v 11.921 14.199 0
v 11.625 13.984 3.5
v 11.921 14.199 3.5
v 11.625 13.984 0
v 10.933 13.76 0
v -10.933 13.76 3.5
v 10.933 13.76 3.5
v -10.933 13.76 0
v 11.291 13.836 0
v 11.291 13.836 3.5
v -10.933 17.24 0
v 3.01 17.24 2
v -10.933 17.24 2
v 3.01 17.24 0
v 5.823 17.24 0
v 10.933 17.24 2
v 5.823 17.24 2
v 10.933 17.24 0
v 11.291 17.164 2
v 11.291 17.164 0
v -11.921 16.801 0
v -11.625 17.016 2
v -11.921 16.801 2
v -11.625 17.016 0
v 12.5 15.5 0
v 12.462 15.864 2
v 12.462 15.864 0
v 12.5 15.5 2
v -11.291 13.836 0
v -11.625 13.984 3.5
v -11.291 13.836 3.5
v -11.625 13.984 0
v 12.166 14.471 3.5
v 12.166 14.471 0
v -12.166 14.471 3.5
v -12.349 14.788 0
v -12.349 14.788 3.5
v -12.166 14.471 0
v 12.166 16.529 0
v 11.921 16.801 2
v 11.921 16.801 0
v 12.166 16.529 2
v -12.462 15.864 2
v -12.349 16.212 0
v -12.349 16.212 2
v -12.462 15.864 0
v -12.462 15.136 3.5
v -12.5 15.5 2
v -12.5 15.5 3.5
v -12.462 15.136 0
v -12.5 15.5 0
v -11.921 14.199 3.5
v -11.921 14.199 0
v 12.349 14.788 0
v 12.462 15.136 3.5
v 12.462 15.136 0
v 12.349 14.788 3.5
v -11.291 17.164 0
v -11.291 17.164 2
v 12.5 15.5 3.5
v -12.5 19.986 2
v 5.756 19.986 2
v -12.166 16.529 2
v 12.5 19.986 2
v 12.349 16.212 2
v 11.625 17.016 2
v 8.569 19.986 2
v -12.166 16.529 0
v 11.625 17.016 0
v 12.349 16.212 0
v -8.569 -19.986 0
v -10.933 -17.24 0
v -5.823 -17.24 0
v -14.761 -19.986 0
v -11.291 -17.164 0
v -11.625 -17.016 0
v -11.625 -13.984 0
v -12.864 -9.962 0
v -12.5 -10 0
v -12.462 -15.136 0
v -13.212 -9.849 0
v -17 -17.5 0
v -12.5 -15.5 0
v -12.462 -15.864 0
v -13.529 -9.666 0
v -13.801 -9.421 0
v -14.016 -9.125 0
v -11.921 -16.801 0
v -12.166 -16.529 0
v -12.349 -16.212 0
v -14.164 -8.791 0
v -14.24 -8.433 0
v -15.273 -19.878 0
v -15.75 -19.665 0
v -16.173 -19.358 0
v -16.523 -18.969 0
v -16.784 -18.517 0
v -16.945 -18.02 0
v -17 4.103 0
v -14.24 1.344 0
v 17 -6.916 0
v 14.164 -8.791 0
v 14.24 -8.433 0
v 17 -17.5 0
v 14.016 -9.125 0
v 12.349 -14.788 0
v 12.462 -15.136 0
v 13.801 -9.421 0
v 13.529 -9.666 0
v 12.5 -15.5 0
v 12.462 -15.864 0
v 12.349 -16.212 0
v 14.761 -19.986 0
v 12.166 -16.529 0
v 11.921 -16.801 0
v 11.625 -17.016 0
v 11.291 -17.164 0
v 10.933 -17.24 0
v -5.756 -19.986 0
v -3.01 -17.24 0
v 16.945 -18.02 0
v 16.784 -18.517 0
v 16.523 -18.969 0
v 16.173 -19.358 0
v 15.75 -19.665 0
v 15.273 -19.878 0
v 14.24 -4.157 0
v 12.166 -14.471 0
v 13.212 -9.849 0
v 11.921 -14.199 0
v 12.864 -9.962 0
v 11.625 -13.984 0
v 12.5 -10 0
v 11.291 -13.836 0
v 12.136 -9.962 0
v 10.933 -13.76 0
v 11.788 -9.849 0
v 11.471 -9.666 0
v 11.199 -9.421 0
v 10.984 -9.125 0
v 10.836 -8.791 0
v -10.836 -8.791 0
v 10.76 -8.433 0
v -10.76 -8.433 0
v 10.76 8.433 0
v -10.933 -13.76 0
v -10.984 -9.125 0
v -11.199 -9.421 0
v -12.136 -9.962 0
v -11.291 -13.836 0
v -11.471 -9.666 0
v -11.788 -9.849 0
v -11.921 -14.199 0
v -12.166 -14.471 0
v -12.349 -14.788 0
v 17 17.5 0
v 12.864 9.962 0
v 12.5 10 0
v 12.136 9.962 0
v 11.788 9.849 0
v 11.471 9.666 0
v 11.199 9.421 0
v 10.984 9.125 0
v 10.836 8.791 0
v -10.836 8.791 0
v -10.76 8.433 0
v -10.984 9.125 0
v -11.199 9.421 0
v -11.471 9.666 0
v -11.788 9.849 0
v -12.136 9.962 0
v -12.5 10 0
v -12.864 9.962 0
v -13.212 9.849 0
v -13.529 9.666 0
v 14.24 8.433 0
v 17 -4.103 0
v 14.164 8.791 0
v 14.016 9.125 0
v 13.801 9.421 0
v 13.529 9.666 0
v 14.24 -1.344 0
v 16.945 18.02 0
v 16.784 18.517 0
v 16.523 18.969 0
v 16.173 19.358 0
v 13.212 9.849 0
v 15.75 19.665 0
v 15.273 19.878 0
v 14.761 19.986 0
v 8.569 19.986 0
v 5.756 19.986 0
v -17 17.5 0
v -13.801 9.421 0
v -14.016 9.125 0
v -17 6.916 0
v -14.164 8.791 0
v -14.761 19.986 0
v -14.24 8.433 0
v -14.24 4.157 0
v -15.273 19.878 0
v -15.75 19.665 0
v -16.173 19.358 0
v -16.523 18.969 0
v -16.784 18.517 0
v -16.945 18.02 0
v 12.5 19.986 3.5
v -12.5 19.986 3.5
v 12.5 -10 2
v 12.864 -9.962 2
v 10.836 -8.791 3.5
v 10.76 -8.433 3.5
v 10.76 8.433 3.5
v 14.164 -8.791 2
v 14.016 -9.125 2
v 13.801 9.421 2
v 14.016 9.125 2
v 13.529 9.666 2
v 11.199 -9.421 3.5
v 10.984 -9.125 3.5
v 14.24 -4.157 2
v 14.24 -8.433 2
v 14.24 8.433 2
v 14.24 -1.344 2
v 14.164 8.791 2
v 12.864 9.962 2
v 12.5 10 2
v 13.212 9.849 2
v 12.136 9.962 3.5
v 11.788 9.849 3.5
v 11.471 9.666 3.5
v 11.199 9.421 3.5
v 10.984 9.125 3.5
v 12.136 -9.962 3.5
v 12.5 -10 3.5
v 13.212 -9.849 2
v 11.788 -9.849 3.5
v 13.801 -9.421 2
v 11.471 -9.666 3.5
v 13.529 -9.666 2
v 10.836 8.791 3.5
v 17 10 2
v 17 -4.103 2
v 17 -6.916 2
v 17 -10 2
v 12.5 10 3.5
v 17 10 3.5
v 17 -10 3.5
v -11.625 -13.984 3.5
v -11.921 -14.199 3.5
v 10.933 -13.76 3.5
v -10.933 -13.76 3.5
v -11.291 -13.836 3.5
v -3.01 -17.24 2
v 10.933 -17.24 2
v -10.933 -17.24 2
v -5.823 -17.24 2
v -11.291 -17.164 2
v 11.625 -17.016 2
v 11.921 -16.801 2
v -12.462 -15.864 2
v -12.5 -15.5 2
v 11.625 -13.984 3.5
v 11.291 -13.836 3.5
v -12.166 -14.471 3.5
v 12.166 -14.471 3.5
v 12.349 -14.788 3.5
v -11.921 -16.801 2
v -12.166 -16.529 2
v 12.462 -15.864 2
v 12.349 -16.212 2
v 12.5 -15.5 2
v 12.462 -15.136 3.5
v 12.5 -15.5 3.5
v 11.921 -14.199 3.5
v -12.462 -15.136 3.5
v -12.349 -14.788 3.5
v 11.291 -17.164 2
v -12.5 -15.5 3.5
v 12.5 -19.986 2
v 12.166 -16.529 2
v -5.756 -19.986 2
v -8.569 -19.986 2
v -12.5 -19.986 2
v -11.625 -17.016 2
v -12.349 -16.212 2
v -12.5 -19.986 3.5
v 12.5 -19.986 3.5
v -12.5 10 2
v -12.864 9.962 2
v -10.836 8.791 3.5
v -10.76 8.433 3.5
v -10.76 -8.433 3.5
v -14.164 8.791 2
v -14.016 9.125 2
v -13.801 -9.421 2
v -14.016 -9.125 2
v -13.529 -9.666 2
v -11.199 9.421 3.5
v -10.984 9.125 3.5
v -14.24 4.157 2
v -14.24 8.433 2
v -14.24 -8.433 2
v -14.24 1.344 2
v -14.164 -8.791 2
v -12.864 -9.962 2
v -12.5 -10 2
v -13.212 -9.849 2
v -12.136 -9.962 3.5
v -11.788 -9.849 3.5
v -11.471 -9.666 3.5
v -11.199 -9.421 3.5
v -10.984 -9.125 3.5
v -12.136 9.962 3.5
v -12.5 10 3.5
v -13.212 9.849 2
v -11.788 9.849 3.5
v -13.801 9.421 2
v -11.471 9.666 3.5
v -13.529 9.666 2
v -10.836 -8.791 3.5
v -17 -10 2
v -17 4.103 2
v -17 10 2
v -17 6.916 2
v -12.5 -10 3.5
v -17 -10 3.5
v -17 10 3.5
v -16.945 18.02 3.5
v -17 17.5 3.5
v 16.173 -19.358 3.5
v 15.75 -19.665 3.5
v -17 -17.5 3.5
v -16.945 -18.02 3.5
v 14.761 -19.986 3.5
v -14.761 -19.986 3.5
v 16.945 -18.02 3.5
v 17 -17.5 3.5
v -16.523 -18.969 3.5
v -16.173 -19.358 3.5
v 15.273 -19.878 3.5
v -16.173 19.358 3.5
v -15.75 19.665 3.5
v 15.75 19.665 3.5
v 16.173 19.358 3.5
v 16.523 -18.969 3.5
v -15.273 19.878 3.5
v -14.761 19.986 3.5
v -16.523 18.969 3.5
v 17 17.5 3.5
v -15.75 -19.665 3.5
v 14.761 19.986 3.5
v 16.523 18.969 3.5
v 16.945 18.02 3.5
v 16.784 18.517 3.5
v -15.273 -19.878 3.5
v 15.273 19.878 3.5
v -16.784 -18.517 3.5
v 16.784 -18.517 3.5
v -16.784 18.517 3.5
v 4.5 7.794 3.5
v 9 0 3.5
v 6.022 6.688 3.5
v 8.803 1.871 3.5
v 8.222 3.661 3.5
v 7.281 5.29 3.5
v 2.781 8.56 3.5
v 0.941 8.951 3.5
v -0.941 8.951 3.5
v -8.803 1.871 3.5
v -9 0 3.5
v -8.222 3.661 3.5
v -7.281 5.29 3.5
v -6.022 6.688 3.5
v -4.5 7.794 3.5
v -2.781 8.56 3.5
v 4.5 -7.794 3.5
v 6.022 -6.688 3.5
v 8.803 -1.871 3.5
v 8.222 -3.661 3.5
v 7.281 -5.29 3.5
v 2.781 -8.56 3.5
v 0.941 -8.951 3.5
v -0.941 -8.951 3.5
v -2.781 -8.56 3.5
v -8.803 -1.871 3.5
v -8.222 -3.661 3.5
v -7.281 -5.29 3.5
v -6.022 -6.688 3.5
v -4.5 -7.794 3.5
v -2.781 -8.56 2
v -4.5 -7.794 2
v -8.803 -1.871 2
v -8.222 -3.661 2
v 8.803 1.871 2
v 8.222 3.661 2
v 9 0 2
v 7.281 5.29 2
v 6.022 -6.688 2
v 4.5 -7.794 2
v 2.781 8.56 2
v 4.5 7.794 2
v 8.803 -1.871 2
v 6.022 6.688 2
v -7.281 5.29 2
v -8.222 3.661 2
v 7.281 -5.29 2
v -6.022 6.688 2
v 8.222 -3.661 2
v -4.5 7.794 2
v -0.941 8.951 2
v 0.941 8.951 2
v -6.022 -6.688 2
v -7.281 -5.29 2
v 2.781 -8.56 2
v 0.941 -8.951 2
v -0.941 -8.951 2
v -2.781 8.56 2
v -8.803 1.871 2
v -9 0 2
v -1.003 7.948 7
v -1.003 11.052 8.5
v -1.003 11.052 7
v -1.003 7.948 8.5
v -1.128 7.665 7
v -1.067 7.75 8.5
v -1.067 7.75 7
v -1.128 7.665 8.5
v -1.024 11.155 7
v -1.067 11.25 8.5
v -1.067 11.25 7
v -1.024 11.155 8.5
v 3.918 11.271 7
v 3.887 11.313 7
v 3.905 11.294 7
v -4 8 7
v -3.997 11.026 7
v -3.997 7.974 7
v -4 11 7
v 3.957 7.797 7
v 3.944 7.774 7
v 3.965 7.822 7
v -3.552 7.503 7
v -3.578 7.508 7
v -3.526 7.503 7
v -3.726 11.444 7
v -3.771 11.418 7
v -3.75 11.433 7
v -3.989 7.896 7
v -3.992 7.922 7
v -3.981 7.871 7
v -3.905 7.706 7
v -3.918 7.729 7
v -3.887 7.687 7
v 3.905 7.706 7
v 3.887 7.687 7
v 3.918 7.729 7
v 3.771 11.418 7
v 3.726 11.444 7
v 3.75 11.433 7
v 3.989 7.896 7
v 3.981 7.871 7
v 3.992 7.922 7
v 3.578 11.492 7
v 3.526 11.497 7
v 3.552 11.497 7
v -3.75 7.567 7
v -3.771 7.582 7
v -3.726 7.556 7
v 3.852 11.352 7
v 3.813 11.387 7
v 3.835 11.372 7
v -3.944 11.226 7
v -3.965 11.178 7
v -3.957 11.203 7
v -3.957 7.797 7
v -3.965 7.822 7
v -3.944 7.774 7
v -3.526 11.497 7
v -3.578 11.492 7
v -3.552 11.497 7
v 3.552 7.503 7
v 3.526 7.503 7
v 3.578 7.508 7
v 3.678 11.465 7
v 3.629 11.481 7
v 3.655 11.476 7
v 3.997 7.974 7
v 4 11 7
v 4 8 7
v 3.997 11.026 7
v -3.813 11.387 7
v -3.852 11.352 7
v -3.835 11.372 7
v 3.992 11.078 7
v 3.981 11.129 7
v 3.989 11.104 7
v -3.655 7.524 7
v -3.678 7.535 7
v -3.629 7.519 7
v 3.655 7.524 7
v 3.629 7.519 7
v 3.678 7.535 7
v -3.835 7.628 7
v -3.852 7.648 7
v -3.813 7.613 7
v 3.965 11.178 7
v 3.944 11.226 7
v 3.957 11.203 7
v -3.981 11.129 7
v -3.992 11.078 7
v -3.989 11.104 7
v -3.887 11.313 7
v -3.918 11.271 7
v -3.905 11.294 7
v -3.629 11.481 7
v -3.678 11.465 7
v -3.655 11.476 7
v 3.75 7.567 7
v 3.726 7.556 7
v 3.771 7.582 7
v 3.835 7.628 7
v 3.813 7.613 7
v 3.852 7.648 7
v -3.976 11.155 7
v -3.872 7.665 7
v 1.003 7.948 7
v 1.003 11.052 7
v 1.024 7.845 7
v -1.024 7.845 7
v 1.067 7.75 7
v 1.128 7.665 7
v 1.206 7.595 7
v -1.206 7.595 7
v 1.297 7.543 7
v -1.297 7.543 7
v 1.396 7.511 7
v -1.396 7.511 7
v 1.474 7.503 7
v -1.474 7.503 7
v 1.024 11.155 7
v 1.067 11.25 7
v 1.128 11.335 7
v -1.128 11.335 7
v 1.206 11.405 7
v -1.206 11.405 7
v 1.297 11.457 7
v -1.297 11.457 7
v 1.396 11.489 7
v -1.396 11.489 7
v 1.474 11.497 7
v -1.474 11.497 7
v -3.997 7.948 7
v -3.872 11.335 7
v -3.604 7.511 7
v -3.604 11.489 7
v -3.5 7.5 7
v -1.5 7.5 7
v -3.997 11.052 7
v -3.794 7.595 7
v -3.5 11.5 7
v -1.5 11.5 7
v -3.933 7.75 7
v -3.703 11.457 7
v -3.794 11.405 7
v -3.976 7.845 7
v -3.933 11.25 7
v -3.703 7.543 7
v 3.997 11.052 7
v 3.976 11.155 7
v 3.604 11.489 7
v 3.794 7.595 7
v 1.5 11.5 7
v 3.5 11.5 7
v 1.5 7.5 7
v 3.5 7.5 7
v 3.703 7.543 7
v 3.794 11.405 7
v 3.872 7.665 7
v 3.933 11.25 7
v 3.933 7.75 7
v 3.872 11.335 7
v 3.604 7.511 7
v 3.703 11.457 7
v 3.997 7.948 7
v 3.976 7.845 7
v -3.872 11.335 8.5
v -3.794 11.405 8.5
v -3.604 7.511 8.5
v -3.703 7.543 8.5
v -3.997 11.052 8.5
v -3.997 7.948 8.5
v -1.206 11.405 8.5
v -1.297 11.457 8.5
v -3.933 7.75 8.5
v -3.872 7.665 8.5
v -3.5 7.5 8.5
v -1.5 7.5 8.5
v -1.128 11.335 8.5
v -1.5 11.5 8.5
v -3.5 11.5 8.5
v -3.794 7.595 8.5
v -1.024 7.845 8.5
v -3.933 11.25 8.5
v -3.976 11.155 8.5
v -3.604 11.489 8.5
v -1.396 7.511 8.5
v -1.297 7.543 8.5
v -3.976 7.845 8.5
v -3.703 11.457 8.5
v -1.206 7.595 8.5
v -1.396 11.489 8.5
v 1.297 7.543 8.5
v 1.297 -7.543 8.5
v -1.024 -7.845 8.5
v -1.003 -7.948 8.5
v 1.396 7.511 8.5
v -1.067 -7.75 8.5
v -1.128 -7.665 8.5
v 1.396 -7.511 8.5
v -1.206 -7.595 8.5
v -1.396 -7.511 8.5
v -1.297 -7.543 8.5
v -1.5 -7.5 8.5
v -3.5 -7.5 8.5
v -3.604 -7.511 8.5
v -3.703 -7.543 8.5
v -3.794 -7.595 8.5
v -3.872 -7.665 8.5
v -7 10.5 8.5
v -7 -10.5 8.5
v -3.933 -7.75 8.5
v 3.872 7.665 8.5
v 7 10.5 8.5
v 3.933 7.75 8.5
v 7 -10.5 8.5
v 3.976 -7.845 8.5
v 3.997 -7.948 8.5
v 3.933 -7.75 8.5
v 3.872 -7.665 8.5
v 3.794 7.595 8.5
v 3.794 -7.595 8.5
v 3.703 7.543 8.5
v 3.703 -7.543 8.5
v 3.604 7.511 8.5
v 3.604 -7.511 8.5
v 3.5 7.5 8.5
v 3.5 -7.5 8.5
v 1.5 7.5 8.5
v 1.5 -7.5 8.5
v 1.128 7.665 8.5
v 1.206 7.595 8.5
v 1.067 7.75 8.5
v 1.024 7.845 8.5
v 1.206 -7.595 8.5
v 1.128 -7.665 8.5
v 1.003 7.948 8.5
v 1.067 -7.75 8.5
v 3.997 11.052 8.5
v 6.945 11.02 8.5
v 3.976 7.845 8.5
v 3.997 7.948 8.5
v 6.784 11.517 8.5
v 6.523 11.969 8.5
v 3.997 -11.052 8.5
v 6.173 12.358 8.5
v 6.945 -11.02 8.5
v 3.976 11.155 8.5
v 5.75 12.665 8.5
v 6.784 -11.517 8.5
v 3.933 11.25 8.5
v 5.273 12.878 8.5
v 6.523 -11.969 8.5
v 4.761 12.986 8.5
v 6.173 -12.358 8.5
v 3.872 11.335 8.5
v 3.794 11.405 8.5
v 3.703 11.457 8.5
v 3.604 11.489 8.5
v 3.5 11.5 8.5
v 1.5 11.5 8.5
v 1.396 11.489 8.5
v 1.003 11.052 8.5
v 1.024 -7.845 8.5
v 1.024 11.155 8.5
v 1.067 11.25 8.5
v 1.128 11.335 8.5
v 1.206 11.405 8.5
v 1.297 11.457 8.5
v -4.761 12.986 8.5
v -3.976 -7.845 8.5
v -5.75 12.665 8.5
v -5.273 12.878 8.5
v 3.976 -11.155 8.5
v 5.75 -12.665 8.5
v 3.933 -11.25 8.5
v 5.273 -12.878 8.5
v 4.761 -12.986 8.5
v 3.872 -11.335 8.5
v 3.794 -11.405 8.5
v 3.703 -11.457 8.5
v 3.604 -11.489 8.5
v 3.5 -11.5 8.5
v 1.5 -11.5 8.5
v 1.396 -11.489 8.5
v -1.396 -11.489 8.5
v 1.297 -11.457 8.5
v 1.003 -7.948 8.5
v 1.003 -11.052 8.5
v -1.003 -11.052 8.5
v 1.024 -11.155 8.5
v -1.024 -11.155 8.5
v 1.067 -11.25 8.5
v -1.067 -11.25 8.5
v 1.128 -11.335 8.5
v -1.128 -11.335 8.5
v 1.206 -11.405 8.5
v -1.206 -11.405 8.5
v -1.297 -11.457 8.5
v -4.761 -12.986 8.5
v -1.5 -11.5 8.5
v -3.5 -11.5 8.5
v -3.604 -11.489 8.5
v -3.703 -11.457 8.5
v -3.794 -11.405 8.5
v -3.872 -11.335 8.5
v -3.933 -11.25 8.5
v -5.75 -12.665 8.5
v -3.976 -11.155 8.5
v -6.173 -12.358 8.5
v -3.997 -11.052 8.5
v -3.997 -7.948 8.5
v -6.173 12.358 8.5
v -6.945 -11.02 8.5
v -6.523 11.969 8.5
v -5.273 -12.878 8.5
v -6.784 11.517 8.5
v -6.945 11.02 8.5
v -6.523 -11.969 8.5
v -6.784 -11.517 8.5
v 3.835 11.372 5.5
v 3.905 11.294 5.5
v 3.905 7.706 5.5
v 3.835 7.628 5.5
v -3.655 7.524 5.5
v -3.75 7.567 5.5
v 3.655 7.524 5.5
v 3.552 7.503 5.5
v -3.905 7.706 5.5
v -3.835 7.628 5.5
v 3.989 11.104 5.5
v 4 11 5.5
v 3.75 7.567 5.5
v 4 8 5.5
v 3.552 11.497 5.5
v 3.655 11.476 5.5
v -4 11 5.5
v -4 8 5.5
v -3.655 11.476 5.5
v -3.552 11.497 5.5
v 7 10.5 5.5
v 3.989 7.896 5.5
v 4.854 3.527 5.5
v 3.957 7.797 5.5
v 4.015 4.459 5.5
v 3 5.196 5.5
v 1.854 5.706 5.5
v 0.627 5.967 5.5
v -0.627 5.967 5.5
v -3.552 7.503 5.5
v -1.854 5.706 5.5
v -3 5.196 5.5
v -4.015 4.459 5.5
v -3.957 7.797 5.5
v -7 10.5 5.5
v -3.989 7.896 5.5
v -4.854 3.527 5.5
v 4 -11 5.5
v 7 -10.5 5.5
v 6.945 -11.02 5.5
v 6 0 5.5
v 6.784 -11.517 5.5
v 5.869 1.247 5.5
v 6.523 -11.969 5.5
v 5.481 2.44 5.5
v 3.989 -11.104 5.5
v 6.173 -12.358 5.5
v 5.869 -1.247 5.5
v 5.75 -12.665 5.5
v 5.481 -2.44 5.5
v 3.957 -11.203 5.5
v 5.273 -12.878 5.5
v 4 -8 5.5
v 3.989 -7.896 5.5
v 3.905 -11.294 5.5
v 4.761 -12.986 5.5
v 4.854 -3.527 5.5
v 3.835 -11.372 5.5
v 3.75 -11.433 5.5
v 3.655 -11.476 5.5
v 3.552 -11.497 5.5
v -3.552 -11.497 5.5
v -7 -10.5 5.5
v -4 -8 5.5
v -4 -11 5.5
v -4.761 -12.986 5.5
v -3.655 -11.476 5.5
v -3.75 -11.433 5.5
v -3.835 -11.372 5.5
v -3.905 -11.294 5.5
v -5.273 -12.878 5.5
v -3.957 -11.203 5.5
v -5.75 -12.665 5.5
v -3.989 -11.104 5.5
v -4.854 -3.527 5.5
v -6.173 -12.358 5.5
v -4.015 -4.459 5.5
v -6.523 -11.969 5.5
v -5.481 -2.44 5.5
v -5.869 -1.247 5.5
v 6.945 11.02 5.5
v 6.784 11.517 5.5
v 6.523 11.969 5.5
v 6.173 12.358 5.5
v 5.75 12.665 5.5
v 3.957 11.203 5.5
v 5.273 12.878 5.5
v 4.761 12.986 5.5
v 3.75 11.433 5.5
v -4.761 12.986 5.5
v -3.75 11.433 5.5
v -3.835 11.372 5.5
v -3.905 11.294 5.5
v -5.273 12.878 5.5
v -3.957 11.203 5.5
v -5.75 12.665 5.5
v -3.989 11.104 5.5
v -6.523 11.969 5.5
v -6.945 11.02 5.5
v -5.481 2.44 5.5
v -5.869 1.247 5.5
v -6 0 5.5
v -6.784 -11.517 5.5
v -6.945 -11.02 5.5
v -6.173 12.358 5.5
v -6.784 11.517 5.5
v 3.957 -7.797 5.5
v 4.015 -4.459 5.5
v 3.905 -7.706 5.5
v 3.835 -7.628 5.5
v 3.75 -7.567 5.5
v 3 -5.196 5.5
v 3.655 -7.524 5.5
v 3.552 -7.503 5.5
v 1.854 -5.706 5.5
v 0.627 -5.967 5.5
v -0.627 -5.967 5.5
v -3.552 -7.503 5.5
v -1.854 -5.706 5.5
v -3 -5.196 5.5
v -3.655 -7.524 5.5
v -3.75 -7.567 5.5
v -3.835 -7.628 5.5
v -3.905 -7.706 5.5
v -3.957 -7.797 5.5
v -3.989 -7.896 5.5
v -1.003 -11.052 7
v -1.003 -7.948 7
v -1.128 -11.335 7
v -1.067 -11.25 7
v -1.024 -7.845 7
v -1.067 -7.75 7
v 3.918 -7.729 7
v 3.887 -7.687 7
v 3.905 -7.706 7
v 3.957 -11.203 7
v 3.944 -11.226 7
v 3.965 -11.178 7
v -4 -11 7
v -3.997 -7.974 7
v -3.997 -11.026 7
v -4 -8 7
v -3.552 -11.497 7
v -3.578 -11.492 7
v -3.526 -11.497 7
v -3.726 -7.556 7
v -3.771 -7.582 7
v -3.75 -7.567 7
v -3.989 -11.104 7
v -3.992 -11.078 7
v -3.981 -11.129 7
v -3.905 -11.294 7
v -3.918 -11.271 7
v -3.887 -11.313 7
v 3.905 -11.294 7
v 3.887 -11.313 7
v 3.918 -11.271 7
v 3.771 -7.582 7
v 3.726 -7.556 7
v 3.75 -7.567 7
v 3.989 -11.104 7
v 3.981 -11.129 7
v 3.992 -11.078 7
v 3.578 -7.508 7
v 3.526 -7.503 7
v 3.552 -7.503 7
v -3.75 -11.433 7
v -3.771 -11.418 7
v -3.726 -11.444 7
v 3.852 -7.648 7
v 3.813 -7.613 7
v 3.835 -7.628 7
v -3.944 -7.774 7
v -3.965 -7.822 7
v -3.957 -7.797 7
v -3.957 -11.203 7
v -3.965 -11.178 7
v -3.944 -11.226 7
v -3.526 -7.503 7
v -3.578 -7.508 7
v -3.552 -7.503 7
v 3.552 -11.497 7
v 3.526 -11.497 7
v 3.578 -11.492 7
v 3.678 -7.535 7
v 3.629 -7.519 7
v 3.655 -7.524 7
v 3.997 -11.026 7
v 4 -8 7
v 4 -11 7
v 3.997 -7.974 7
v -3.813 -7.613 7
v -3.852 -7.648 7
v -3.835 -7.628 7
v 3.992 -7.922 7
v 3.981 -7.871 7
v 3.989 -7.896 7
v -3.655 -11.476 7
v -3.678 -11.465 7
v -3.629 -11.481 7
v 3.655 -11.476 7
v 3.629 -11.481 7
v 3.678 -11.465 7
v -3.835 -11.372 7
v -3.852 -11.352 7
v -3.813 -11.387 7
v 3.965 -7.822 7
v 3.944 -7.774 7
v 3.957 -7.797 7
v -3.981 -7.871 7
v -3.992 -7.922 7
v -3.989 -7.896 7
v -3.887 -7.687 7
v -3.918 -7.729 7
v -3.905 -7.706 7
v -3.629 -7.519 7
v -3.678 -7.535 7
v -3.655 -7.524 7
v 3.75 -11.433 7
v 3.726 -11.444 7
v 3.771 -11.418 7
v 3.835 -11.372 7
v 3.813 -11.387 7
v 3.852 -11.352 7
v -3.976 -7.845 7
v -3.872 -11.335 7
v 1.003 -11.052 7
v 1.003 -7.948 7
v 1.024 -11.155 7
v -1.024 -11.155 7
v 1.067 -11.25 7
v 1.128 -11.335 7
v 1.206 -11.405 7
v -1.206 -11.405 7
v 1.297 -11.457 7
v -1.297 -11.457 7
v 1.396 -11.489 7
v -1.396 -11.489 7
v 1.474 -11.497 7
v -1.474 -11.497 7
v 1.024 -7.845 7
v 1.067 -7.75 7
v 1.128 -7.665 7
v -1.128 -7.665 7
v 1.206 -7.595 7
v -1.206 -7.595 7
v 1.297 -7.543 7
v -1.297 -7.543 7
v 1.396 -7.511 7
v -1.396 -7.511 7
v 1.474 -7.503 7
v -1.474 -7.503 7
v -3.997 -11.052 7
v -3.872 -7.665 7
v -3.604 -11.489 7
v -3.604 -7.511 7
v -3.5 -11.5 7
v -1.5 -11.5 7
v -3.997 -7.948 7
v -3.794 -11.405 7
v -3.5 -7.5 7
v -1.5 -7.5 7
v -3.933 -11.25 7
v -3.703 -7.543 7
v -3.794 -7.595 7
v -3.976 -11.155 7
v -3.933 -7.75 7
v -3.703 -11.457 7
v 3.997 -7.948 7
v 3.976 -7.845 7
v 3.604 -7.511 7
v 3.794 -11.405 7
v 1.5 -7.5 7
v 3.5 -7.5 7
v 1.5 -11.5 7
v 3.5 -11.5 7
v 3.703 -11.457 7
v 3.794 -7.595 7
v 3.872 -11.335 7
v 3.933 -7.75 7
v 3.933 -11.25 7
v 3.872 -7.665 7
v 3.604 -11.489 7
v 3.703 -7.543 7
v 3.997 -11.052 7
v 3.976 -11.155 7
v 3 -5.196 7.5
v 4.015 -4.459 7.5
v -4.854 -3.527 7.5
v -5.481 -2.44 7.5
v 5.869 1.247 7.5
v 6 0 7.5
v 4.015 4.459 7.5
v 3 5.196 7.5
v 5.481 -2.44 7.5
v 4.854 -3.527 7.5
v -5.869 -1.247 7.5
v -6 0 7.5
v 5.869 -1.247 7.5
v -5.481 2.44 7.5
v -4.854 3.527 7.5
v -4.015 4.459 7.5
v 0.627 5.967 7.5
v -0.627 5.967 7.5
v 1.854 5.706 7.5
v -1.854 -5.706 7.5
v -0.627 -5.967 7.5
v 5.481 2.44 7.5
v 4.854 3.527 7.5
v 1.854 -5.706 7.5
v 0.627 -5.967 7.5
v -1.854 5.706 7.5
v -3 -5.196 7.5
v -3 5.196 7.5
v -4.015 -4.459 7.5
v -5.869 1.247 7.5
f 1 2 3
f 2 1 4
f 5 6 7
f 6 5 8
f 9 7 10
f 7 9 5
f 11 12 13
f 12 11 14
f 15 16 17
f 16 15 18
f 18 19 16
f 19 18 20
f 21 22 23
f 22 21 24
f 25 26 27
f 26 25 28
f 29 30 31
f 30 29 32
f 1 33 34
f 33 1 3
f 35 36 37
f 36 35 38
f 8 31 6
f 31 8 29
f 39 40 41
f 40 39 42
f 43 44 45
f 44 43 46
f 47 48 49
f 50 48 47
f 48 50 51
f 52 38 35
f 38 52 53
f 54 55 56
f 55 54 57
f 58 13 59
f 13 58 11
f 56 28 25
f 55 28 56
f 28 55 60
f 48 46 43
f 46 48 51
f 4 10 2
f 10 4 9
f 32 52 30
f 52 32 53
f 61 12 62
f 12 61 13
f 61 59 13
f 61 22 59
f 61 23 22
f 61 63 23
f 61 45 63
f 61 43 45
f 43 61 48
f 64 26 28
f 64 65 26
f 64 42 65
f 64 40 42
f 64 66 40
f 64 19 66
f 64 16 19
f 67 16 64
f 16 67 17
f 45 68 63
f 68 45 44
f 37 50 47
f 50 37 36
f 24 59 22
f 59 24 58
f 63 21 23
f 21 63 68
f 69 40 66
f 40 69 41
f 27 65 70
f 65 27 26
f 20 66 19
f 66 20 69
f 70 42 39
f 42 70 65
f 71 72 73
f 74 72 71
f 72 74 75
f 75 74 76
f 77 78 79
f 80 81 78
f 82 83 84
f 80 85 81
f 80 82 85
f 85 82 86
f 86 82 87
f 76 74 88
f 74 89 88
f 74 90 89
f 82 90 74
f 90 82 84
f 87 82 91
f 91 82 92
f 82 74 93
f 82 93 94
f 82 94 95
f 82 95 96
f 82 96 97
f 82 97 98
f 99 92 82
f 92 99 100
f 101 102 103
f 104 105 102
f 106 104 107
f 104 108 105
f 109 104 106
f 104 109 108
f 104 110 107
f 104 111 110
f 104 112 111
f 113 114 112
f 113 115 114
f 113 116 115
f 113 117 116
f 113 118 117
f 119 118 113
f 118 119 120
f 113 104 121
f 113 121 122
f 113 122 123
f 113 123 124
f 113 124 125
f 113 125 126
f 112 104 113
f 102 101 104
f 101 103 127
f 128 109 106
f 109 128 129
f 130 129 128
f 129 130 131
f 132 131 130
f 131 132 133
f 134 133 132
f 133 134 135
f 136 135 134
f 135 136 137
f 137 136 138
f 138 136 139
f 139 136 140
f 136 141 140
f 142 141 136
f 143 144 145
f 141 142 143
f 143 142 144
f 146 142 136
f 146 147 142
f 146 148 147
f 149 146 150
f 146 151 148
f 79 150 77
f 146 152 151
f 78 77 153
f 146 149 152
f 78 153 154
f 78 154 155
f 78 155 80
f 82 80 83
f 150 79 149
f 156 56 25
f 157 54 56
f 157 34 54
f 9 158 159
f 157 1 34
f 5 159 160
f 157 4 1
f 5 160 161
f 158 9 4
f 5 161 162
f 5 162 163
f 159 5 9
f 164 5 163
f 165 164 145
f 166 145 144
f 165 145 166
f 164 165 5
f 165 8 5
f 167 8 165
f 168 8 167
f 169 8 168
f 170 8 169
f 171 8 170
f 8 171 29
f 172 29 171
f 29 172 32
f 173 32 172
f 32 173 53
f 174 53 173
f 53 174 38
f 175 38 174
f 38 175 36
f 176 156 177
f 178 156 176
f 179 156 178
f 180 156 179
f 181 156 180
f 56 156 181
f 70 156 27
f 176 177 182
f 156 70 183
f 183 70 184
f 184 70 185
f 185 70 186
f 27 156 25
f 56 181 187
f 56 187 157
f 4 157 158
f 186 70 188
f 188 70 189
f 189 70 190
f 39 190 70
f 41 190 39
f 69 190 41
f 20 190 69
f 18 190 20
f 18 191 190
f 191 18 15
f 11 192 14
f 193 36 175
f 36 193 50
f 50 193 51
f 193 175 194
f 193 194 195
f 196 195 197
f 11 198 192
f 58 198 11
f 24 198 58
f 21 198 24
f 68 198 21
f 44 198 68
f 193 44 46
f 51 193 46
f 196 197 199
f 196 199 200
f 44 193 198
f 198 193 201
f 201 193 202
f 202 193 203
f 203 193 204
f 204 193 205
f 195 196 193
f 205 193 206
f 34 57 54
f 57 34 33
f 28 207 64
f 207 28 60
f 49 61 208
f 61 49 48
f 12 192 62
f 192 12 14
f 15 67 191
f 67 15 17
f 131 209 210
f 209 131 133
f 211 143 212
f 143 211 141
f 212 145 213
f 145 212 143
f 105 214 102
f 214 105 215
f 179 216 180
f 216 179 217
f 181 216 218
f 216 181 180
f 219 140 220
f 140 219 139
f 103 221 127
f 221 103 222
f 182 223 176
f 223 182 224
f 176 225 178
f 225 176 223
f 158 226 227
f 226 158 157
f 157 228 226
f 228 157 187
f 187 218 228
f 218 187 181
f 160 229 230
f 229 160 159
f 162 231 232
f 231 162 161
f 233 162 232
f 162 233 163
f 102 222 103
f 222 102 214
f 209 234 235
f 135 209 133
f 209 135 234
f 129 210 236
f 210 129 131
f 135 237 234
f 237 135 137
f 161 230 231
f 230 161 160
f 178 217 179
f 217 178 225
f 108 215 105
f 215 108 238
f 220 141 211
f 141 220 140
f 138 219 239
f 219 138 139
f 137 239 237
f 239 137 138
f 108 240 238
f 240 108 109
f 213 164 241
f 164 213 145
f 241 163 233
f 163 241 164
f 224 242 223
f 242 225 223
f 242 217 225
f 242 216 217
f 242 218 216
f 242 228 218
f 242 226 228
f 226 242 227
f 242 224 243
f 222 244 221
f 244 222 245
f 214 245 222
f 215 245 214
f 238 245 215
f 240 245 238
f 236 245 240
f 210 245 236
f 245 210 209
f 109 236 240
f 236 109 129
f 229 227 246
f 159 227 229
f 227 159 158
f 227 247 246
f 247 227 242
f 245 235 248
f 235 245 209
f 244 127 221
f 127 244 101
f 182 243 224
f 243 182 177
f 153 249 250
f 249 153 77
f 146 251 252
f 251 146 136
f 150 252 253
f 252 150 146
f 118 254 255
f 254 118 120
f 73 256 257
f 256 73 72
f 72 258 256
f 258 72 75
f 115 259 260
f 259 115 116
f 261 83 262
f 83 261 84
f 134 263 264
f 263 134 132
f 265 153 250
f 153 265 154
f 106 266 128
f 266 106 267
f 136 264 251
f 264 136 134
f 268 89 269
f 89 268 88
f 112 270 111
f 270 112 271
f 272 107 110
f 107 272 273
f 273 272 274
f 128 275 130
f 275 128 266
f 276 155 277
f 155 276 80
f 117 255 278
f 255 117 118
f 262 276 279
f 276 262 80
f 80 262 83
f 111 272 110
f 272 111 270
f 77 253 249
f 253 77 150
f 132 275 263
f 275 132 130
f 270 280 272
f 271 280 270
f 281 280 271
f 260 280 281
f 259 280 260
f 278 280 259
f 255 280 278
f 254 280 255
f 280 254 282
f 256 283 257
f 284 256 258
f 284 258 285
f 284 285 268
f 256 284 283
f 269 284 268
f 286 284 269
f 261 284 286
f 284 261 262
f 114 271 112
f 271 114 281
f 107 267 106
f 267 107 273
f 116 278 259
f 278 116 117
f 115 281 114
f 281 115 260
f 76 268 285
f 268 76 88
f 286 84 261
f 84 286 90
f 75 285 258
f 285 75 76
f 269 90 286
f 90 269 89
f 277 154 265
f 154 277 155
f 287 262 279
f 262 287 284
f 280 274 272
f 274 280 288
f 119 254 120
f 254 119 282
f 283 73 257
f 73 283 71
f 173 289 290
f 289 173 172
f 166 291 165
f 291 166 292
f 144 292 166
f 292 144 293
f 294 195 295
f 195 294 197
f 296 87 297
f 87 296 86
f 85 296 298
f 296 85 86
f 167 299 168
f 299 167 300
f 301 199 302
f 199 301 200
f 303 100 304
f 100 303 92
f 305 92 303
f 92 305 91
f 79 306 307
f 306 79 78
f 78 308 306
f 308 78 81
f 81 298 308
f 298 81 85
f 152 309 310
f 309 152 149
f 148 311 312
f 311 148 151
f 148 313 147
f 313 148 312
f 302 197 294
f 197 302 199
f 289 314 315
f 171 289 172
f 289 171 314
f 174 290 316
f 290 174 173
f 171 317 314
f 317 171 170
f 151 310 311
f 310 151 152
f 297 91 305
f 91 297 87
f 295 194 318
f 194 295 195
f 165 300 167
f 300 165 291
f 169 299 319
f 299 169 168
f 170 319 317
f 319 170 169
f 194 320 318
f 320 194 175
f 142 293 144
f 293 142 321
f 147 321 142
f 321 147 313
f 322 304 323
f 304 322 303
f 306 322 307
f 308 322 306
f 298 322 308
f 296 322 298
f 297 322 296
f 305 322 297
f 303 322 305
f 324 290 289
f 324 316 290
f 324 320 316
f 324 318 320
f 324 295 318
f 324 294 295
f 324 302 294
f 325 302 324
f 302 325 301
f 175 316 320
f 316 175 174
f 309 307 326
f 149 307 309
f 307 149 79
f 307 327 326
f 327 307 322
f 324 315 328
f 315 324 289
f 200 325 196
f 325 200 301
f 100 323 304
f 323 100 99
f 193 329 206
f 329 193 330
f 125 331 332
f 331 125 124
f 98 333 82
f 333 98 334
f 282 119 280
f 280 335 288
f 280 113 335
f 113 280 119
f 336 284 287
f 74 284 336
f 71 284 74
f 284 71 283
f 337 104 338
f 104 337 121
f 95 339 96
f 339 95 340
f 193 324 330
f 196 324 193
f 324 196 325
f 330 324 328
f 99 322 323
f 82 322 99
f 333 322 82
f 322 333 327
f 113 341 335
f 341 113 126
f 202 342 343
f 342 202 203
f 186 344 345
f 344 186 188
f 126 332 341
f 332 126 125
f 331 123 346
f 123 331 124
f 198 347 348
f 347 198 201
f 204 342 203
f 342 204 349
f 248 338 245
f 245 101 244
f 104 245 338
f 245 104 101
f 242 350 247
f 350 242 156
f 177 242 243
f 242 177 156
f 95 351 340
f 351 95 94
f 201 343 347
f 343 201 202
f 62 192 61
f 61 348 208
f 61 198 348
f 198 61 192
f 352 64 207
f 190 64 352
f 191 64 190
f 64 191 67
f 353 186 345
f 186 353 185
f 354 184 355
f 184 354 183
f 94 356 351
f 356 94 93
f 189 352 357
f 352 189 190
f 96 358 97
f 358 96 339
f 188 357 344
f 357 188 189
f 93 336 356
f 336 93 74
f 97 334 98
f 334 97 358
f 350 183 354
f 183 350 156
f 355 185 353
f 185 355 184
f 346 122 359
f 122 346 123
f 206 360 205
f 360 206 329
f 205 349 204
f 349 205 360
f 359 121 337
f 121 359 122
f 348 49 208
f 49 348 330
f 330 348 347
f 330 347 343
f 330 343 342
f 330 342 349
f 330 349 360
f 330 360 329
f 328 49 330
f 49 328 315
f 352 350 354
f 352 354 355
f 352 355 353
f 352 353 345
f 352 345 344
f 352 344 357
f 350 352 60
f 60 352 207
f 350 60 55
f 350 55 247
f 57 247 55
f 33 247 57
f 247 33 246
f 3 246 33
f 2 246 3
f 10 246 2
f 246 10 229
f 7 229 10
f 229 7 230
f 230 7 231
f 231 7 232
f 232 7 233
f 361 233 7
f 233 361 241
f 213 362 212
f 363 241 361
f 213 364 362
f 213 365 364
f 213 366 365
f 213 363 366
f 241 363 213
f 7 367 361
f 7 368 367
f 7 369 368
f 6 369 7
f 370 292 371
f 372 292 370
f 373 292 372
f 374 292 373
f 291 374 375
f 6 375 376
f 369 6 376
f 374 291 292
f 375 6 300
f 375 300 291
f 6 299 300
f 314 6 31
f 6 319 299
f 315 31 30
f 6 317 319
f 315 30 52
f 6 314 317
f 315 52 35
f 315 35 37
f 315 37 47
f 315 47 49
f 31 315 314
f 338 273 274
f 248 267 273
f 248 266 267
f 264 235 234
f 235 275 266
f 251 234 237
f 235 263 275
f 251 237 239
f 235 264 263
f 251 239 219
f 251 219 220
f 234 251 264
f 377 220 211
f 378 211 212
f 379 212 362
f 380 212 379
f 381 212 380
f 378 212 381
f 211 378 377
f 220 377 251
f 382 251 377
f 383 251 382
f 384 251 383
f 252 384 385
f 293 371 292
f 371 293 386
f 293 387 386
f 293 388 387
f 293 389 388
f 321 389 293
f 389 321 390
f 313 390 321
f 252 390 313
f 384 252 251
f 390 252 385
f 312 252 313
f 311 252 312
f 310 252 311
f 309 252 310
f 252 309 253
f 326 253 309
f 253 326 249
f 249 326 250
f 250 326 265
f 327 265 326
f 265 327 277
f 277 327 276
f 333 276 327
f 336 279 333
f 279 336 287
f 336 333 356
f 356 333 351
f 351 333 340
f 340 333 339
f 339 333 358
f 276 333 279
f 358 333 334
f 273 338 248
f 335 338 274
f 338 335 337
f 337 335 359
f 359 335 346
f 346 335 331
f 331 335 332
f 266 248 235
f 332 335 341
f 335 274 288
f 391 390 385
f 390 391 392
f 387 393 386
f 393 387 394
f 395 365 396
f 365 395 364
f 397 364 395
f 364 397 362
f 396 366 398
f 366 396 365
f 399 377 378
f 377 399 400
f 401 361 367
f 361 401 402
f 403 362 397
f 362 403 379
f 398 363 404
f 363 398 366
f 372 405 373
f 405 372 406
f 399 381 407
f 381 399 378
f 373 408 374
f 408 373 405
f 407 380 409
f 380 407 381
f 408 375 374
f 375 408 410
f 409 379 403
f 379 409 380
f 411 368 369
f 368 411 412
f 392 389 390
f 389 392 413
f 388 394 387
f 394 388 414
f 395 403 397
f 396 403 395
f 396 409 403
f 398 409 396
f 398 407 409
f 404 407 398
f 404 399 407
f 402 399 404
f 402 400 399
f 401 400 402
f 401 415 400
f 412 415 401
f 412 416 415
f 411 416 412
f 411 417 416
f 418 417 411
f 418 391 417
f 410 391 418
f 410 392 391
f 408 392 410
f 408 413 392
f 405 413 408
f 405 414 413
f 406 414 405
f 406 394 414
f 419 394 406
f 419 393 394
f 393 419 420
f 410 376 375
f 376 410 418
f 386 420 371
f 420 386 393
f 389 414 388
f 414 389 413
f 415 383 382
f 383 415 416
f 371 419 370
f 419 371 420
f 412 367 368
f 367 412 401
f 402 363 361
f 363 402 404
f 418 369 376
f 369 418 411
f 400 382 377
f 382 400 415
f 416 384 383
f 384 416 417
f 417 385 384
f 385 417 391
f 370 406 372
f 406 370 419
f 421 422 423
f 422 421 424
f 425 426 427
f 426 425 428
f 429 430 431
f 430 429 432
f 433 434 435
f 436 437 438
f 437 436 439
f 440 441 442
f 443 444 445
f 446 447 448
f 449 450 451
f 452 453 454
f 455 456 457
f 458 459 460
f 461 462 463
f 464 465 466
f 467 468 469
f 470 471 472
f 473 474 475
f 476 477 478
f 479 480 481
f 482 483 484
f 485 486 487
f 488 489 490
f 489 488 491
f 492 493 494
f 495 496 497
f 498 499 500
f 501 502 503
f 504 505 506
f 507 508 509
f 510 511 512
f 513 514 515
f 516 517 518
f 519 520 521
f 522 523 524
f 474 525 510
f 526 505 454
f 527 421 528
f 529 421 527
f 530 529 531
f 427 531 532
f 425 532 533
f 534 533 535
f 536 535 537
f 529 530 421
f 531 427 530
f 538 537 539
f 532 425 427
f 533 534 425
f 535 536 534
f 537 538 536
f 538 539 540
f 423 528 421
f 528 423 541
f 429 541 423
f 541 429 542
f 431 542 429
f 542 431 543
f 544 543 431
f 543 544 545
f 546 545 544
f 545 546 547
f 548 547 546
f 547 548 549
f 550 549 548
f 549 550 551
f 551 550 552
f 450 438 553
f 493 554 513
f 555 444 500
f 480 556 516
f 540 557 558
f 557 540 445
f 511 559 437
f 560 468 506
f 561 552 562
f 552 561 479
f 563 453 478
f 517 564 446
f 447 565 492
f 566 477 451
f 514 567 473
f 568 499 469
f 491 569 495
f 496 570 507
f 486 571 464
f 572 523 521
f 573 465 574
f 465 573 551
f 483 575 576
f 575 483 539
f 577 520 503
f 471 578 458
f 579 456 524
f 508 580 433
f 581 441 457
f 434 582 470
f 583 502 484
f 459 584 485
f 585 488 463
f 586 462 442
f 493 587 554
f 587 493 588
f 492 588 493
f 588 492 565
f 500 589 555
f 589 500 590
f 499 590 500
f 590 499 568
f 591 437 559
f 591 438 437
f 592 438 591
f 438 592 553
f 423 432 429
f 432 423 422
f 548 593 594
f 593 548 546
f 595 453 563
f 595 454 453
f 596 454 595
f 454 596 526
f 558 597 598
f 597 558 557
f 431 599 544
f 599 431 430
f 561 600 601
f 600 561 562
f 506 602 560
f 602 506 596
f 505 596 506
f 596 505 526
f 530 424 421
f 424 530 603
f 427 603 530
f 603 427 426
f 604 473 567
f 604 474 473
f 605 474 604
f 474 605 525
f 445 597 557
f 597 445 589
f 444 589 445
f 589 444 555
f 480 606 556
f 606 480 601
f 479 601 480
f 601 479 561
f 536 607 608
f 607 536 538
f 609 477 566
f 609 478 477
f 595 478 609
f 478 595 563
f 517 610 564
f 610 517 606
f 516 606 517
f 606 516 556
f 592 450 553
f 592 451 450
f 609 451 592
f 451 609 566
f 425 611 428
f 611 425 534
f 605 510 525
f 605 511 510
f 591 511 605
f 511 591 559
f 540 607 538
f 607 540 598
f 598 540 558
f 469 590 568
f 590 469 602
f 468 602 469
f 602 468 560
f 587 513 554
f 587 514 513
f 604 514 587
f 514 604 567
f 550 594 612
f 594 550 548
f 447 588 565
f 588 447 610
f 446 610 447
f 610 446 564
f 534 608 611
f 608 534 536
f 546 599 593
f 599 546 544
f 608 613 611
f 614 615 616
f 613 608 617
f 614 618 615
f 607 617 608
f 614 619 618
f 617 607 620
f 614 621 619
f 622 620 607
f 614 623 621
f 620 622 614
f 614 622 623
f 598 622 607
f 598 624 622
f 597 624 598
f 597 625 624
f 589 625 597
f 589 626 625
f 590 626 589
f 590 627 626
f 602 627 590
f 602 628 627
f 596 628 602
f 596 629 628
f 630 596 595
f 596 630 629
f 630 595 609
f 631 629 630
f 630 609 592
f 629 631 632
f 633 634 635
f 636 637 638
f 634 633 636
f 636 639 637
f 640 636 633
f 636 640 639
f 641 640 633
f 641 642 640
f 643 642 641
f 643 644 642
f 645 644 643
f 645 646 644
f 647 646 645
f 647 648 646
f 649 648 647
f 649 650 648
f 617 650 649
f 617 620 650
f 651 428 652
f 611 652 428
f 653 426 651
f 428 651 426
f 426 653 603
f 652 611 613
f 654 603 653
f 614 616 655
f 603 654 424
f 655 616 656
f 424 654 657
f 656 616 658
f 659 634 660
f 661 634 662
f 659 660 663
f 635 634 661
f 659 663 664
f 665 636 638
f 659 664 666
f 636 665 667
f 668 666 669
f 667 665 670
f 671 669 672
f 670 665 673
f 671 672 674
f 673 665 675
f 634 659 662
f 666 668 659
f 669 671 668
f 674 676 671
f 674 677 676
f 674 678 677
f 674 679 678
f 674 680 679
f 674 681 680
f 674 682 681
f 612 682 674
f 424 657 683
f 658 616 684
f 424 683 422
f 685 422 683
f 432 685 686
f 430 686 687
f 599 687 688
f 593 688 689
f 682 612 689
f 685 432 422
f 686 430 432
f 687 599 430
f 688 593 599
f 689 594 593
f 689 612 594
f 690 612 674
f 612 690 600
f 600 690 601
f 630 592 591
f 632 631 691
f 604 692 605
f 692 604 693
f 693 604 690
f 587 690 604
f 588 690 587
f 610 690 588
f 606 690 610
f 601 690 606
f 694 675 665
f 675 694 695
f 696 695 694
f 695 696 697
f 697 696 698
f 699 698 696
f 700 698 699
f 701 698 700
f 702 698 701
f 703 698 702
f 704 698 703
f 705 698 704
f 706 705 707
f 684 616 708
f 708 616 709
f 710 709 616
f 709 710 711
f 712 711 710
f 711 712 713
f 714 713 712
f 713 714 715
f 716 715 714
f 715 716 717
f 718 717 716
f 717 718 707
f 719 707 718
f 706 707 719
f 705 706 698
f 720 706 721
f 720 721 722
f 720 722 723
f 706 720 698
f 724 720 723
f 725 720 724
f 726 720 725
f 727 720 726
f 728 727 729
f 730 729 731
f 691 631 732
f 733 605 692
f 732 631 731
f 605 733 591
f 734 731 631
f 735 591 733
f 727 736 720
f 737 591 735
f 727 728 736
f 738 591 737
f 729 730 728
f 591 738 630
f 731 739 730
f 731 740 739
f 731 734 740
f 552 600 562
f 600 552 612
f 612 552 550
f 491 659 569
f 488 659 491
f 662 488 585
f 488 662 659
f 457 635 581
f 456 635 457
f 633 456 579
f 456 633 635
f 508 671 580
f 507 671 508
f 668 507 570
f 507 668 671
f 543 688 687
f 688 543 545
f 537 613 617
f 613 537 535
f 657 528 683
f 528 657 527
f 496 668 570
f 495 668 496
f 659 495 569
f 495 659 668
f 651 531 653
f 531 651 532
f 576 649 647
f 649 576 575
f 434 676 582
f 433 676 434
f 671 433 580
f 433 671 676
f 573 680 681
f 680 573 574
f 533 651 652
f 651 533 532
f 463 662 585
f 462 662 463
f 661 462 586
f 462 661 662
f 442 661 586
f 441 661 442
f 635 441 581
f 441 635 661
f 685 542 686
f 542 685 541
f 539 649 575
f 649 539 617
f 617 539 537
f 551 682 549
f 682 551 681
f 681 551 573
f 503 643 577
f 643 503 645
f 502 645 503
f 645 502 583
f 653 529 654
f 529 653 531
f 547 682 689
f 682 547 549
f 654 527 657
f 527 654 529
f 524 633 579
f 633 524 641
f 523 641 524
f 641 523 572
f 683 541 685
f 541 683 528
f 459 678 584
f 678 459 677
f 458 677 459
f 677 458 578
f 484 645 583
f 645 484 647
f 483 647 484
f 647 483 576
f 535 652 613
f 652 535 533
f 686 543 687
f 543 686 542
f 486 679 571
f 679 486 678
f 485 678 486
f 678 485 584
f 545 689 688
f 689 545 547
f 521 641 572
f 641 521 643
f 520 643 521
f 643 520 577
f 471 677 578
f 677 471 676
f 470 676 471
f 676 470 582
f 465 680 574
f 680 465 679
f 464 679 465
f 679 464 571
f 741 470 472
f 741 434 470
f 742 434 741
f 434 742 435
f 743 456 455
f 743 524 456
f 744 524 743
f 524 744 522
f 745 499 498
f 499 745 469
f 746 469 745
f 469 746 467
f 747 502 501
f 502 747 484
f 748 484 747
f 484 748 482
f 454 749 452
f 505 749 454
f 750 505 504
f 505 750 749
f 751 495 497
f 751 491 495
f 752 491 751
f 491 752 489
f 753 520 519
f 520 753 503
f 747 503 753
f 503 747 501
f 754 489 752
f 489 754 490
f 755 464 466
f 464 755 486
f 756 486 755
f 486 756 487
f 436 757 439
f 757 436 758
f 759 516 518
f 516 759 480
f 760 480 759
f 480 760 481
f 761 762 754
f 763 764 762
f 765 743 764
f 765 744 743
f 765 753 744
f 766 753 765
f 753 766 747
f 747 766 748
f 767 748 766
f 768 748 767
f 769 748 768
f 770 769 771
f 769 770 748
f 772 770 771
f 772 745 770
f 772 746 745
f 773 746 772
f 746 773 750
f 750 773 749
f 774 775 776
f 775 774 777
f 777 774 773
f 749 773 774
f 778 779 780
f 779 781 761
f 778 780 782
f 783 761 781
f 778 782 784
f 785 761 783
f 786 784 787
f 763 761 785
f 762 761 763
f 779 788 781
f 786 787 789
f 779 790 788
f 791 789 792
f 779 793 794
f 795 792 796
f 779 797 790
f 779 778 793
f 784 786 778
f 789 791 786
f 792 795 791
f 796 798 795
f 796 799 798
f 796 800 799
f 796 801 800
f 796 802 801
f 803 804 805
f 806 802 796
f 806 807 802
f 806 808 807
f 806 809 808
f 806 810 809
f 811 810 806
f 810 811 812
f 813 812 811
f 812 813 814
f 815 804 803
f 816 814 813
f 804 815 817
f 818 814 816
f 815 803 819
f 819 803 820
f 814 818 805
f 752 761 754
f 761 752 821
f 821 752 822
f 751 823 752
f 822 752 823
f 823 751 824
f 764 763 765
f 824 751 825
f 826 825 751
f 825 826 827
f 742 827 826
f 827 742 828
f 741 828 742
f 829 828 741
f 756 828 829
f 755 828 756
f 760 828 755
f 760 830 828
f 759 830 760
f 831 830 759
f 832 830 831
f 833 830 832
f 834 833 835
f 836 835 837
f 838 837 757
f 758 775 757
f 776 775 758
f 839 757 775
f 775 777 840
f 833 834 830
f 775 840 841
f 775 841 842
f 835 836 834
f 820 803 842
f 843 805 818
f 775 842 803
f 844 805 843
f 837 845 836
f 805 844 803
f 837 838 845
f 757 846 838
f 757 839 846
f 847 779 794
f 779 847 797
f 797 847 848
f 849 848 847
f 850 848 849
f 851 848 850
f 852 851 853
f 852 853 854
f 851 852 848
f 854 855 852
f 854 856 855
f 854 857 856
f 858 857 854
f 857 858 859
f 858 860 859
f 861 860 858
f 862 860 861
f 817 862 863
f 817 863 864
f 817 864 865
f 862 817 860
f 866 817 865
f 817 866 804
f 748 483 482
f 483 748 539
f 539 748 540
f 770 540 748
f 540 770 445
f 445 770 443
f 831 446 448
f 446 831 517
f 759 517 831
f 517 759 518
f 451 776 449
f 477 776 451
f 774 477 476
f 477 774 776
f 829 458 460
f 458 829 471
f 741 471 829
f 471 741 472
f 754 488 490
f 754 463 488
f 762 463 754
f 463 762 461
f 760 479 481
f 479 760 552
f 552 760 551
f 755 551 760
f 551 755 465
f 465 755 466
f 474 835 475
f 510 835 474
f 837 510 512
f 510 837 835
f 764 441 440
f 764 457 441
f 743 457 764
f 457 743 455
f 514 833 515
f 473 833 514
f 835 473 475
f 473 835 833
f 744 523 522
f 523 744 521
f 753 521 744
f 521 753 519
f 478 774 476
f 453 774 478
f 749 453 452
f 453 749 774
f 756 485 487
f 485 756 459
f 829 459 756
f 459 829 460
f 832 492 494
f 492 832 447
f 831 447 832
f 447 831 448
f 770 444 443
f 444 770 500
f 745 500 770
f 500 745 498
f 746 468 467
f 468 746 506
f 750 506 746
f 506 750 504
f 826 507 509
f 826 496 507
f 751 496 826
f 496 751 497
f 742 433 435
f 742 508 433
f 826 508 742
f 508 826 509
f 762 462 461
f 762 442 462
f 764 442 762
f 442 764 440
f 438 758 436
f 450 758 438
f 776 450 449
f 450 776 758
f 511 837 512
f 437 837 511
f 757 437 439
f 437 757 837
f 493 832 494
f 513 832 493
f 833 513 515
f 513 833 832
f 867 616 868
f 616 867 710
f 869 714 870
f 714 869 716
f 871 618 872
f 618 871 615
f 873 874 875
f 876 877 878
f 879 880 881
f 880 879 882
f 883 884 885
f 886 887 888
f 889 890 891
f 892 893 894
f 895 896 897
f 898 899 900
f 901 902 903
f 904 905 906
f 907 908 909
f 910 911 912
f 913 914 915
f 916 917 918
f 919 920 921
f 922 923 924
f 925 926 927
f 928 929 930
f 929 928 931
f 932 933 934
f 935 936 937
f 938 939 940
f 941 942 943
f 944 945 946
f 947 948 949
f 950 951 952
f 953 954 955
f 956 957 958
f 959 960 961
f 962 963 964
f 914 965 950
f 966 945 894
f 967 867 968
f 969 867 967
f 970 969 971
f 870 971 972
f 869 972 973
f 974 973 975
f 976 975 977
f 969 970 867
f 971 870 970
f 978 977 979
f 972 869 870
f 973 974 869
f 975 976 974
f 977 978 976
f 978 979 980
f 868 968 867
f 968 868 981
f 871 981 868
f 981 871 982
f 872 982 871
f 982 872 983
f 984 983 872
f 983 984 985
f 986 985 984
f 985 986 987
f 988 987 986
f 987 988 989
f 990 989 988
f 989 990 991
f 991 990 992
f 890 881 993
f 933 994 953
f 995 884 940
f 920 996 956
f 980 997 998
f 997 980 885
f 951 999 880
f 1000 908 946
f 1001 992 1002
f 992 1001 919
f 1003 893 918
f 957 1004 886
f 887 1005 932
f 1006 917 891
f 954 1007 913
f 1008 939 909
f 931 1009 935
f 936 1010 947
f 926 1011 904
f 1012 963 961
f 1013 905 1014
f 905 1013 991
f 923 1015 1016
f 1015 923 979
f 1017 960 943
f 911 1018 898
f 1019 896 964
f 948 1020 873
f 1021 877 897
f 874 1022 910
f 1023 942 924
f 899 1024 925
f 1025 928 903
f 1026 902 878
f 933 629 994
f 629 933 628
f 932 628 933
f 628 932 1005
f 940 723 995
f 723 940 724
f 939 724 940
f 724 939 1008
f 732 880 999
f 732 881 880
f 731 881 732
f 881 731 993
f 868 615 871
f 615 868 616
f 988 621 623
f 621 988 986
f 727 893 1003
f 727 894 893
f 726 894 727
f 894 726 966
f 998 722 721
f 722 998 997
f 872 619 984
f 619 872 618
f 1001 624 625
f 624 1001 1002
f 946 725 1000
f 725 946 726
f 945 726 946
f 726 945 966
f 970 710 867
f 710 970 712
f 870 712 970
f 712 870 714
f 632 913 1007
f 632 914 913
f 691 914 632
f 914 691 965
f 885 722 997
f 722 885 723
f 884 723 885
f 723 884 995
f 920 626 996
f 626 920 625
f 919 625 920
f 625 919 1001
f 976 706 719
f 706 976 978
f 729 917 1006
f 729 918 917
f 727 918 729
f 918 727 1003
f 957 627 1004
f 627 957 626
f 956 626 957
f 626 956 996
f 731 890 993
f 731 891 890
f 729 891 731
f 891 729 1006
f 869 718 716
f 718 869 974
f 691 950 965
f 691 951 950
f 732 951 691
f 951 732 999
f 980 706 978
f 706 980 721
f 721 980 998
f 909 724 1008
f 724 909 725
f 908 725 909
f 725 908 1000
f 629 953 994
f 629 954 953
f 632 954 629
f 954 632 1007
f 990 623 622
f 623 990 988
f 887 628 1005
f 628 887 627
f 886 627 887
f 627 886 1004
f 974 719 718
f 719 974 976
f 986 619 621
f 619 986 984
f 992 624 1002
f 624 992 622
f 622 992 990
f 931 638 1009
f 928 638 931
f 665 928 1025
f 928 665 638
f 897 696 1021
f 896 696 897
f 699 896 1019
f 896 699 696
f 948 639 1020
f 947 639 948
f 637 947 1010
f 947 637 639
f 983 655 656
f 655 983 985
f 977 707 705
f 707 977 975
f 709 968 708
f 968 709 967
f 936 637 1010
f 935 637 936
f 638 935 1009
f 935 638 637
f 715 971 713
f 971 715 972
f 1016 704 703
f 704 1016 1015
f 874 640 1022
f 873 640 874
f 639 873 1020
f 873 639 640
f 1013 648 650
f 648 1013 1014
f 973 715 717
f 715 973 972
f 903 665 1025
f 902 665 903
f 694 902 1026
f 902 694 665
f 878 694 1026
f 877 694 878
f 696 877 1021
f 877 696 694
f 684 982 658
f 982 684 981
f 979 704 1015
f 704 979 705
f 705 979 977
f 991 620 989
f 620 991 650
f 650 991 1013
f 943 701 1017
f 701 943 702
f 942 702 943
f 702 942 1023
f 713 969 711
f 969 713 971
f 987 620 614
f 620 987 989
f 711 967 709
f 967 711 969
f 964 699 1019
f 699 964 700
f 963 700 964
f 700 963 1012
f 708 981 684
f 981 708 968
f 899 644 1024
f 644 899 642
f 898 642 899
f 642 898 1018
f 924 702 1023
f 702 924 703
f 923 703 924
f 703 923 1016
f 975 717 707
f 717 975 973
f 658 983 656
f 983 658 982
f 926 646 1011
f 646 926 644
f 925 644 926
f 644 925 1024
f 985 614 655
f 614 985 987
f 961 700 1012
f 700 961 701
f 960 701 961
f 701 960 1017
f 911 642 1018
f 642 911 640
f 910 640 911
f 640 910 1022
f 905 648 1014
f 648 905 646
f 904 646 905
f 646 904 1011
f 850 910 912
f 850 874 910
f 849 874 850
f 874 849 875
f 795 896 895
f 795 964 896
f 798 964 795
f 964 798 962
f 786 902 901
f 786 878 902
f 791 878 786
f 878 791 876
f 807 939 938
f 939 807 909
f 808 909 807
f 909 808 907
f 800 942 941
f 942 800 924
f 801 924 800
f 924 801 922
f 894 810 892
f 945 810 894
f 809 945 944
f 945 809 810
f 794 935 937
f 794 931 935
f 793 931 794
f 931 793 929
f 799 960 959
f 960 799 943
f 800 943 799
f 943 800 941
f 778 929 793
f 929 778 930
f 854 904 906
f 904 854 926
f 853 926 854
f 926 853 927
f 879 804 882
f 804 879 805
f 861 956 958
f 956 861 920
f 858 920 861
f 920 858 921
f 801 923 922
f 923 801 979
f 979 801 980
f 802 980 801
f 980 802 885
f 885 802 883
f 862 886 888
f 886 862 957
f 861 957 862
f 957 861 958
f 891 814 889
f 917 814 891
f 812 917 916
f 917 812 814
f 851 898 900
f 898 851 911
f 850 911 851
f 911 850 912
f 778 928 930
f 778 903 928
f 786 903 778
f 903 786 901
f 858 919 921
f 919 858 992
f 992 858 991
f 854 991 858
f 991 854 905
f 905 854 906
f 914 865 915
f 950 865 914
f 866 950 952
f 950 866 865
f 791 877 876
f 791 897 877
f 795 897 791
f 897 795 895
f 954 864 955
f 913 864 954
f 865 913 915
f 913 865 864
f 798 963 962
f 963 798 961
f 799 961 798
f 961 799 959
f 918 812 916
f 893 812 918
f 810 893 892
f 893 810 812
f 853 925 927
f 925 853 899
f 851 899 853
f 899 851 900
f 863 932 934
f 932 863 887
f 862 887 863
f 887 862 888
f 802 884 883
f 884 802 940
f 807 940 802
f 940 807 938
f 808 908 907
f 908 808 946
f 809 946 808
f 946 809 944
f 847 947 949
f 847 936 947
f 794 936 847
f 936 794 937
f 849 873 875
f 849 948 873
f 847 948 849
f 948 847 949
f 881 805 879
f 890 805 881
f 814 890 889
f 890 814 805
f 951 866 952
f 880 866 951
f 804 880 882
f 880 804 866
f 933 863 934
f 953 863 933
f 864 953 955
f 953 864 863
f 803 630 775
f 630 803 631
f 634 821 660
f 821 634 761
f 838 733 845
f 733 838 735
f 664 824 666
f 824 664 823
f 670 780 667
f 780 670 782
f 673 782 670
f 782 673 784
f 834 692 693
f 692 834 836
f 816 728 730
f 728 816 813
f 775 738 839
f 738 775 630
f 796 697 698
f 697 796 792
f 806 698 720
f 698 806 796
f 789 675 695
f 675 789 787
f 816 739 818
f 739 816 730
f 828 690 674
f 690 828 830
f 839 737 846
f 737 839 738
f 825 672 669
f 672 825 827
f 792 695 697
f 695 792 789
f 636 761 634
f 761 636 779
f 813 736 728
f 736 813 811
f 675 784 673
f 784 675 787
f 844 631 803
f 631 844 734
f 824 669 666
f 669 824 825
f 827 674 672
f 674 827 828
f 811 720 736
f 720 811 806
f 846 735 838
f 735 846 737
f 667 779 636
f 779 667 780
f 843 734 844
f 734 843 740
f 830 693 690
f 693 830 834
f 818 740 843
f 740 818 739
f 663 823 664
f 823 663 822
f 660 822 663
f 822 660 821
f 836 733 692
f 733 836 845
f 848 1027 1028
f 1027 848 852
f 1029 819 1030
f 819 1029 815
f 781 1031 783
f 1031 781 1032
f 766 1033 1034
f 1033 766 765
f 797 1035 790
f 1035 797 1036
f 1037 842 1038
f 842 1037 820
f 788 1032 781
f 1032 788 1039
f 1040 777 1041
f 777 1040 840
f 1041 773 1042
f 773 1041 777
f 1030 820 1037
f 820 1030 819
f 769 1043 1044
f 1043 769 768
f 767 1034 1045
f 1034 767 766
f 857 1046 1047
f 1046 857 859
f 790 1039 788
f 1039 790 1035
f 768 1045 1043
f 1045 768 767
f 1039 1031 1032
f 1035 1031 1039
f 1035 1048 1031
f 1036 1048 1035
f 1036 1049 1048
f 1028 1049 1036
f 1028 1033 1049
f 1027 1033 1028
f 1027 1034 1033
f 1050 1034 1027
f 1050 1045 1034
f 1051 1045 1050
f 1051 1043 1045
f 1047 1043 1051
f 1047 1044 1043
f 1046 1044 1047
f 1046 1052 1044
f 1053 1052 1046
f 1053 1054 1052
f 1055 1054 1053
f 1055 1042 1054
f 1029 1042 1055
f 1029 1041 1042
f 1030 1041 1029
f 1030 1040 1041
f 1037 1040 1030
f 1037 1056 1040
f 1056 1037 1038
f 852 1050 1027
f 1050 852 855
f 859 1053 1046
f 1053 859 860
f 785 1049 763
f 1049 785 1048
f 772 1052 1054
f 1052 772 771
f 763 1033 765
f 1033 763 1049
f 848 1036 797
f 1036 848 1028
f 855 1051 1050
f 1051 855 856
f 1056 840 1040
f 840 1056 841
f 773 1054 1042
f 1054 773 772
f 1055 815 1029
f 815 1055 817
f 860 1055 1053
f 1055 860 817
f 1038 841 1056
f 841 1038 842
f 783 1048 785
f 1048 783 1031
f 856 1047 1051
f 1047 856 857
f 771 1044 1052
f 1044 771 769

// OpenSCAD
WEBBING_X = 25;
WEBBING_Y = 20;
WEBBING_THICKNESS = 2;
WEBBING_DIA = 3.5;
WEBBING_OFFSET = 8;

THICKNESS = 3.5;
CORNER_DIA = 5;
LENGTH = 40;
WIDTH = 34;

MAGNET_DIA = 18;
MAGNET_THICKNESS = 3;
MAGNET_OFFSET = 2;

TUBE_SLOT_WIDTH = 8;
TUBE_SLOT_LENGTH = 4;
TUBE_MAGNET_DIA = 12;
TUBE_MAGNET_THICKNESS = 3.2;
TUBE_MAGNET_OFFSET = 1;
TUBE_THICKNESS = 3;
TUBE_WIDTH = TUBE_MAGNET_DIA;
TUBE_LENGTH = TUBE_MAGNET_DIA + 2 * TUBE_SLOT_LENGTH + 2 * TUBE_THICKNESS;

$fn = 30;

module rounded_rect(width, length, thickness, corner_dia) {
  hull() {
    for(i = [-1, 1]) {
      for(j = [-1, 1]) {
        translate([i * (width - corner_dia)/2, j * (length - corner_dia)/2, 0])
        cylinder(d = corner_dia, h = thickness);
      }
    }
  }
}

module webbing_slot(width, length, thickness, corner_dia) {
  union() {
    rounded_rect(width, corner_dia, thickness, corner_dia);
    translate([0, length/2 - corner_dia/2, thickness])
    rounded_rect(width, length, thickness, corner_dia);

    translate([width/3, length/sqrt(2)/2, 0])
    rotate([0, 0, 45])
    rounded_rect(length, thickness, thickness, thickness);
  }
}

module mount() {
  difference() {
    rounded_rect(WIDTH, LENGTH, THICKNESS, CORNER_DIA);

    #for(i = [-1, 1]) {
      rotate([0, 0, i * 90 + 90])
      translate([0, (LENGTH/2 - WEBBING_OFFSET + WEBBING_DIA), 0])
      webbing_slot(WEBBING_X, WEBBING_OFFSET * 2, WEBBING_THICKNESS, WEBBING_DIA);

      rotate([0, 0, i * 90])
      translate([0, (WIDTH/2 - WEBBING_OFFSET + WEBBING_DIA), 0])
      webbing_slot(WEBBING_Y, WEBBING_OFFSET * 2, WEBBING_THICKNESS, WEBBING_DIA);
    }

    #translate([0, 0, MAGNET_OFFSET])
    cylinder(d = MAGNET_DIA, h = MAGNET_THICKNESS);
  }
}

module tube_clamp() {
  difference() {
    hull() {
      rounded_rect(TUBE_SLOT_WIDTH + TUBE_THICKNESS * 2, TUBE_LENGTH, TUBE_THICKNESS, CORNER_DIA);
      cylinder(d = TUBE_MAGNET_DIA, h = TUBE_THICKNESS);
    }

    #for(i = [-1, 1]) {
      translate([0, i * (TUBE_LENGTH/2 - TUBE_THICKNESS/2 - TUBE_SLOT_LENGTH/2), TUBE_THICKNESS/2]) {
        rounded_rect(TUBE_SLOT_WIDTH, TUBE_SLOT_LENGTH, TUBE_THICKNESS/2, 1);

        for(j = [-1, 1]) {
          translate([j * (TUBE_SLOT_WIDTH/2 - TUBE_THICKNESS/2), 0, -TUBE_THICKNESS/2])
          rotate([0, 0, 90])
          rounded_rect(TUBE_SLOT_LENGTH, TUBE_THICKNESS, TUBE_THICKNESS/2, 1);
        }
      }

    }

    #translate([0, 0, TUBE_MAGNET_OFFSET])
    cylinder(d = TUBE_MAGNET_DIA, h = TUBE_MAGNET_THICKNESS);
  }
}

mount();

translate([0, 0, THICKNESS + MAGNET_THICKNESS + MAGNET_OFFSET])
rotate([180, 0, 0])
tube_clamp();
